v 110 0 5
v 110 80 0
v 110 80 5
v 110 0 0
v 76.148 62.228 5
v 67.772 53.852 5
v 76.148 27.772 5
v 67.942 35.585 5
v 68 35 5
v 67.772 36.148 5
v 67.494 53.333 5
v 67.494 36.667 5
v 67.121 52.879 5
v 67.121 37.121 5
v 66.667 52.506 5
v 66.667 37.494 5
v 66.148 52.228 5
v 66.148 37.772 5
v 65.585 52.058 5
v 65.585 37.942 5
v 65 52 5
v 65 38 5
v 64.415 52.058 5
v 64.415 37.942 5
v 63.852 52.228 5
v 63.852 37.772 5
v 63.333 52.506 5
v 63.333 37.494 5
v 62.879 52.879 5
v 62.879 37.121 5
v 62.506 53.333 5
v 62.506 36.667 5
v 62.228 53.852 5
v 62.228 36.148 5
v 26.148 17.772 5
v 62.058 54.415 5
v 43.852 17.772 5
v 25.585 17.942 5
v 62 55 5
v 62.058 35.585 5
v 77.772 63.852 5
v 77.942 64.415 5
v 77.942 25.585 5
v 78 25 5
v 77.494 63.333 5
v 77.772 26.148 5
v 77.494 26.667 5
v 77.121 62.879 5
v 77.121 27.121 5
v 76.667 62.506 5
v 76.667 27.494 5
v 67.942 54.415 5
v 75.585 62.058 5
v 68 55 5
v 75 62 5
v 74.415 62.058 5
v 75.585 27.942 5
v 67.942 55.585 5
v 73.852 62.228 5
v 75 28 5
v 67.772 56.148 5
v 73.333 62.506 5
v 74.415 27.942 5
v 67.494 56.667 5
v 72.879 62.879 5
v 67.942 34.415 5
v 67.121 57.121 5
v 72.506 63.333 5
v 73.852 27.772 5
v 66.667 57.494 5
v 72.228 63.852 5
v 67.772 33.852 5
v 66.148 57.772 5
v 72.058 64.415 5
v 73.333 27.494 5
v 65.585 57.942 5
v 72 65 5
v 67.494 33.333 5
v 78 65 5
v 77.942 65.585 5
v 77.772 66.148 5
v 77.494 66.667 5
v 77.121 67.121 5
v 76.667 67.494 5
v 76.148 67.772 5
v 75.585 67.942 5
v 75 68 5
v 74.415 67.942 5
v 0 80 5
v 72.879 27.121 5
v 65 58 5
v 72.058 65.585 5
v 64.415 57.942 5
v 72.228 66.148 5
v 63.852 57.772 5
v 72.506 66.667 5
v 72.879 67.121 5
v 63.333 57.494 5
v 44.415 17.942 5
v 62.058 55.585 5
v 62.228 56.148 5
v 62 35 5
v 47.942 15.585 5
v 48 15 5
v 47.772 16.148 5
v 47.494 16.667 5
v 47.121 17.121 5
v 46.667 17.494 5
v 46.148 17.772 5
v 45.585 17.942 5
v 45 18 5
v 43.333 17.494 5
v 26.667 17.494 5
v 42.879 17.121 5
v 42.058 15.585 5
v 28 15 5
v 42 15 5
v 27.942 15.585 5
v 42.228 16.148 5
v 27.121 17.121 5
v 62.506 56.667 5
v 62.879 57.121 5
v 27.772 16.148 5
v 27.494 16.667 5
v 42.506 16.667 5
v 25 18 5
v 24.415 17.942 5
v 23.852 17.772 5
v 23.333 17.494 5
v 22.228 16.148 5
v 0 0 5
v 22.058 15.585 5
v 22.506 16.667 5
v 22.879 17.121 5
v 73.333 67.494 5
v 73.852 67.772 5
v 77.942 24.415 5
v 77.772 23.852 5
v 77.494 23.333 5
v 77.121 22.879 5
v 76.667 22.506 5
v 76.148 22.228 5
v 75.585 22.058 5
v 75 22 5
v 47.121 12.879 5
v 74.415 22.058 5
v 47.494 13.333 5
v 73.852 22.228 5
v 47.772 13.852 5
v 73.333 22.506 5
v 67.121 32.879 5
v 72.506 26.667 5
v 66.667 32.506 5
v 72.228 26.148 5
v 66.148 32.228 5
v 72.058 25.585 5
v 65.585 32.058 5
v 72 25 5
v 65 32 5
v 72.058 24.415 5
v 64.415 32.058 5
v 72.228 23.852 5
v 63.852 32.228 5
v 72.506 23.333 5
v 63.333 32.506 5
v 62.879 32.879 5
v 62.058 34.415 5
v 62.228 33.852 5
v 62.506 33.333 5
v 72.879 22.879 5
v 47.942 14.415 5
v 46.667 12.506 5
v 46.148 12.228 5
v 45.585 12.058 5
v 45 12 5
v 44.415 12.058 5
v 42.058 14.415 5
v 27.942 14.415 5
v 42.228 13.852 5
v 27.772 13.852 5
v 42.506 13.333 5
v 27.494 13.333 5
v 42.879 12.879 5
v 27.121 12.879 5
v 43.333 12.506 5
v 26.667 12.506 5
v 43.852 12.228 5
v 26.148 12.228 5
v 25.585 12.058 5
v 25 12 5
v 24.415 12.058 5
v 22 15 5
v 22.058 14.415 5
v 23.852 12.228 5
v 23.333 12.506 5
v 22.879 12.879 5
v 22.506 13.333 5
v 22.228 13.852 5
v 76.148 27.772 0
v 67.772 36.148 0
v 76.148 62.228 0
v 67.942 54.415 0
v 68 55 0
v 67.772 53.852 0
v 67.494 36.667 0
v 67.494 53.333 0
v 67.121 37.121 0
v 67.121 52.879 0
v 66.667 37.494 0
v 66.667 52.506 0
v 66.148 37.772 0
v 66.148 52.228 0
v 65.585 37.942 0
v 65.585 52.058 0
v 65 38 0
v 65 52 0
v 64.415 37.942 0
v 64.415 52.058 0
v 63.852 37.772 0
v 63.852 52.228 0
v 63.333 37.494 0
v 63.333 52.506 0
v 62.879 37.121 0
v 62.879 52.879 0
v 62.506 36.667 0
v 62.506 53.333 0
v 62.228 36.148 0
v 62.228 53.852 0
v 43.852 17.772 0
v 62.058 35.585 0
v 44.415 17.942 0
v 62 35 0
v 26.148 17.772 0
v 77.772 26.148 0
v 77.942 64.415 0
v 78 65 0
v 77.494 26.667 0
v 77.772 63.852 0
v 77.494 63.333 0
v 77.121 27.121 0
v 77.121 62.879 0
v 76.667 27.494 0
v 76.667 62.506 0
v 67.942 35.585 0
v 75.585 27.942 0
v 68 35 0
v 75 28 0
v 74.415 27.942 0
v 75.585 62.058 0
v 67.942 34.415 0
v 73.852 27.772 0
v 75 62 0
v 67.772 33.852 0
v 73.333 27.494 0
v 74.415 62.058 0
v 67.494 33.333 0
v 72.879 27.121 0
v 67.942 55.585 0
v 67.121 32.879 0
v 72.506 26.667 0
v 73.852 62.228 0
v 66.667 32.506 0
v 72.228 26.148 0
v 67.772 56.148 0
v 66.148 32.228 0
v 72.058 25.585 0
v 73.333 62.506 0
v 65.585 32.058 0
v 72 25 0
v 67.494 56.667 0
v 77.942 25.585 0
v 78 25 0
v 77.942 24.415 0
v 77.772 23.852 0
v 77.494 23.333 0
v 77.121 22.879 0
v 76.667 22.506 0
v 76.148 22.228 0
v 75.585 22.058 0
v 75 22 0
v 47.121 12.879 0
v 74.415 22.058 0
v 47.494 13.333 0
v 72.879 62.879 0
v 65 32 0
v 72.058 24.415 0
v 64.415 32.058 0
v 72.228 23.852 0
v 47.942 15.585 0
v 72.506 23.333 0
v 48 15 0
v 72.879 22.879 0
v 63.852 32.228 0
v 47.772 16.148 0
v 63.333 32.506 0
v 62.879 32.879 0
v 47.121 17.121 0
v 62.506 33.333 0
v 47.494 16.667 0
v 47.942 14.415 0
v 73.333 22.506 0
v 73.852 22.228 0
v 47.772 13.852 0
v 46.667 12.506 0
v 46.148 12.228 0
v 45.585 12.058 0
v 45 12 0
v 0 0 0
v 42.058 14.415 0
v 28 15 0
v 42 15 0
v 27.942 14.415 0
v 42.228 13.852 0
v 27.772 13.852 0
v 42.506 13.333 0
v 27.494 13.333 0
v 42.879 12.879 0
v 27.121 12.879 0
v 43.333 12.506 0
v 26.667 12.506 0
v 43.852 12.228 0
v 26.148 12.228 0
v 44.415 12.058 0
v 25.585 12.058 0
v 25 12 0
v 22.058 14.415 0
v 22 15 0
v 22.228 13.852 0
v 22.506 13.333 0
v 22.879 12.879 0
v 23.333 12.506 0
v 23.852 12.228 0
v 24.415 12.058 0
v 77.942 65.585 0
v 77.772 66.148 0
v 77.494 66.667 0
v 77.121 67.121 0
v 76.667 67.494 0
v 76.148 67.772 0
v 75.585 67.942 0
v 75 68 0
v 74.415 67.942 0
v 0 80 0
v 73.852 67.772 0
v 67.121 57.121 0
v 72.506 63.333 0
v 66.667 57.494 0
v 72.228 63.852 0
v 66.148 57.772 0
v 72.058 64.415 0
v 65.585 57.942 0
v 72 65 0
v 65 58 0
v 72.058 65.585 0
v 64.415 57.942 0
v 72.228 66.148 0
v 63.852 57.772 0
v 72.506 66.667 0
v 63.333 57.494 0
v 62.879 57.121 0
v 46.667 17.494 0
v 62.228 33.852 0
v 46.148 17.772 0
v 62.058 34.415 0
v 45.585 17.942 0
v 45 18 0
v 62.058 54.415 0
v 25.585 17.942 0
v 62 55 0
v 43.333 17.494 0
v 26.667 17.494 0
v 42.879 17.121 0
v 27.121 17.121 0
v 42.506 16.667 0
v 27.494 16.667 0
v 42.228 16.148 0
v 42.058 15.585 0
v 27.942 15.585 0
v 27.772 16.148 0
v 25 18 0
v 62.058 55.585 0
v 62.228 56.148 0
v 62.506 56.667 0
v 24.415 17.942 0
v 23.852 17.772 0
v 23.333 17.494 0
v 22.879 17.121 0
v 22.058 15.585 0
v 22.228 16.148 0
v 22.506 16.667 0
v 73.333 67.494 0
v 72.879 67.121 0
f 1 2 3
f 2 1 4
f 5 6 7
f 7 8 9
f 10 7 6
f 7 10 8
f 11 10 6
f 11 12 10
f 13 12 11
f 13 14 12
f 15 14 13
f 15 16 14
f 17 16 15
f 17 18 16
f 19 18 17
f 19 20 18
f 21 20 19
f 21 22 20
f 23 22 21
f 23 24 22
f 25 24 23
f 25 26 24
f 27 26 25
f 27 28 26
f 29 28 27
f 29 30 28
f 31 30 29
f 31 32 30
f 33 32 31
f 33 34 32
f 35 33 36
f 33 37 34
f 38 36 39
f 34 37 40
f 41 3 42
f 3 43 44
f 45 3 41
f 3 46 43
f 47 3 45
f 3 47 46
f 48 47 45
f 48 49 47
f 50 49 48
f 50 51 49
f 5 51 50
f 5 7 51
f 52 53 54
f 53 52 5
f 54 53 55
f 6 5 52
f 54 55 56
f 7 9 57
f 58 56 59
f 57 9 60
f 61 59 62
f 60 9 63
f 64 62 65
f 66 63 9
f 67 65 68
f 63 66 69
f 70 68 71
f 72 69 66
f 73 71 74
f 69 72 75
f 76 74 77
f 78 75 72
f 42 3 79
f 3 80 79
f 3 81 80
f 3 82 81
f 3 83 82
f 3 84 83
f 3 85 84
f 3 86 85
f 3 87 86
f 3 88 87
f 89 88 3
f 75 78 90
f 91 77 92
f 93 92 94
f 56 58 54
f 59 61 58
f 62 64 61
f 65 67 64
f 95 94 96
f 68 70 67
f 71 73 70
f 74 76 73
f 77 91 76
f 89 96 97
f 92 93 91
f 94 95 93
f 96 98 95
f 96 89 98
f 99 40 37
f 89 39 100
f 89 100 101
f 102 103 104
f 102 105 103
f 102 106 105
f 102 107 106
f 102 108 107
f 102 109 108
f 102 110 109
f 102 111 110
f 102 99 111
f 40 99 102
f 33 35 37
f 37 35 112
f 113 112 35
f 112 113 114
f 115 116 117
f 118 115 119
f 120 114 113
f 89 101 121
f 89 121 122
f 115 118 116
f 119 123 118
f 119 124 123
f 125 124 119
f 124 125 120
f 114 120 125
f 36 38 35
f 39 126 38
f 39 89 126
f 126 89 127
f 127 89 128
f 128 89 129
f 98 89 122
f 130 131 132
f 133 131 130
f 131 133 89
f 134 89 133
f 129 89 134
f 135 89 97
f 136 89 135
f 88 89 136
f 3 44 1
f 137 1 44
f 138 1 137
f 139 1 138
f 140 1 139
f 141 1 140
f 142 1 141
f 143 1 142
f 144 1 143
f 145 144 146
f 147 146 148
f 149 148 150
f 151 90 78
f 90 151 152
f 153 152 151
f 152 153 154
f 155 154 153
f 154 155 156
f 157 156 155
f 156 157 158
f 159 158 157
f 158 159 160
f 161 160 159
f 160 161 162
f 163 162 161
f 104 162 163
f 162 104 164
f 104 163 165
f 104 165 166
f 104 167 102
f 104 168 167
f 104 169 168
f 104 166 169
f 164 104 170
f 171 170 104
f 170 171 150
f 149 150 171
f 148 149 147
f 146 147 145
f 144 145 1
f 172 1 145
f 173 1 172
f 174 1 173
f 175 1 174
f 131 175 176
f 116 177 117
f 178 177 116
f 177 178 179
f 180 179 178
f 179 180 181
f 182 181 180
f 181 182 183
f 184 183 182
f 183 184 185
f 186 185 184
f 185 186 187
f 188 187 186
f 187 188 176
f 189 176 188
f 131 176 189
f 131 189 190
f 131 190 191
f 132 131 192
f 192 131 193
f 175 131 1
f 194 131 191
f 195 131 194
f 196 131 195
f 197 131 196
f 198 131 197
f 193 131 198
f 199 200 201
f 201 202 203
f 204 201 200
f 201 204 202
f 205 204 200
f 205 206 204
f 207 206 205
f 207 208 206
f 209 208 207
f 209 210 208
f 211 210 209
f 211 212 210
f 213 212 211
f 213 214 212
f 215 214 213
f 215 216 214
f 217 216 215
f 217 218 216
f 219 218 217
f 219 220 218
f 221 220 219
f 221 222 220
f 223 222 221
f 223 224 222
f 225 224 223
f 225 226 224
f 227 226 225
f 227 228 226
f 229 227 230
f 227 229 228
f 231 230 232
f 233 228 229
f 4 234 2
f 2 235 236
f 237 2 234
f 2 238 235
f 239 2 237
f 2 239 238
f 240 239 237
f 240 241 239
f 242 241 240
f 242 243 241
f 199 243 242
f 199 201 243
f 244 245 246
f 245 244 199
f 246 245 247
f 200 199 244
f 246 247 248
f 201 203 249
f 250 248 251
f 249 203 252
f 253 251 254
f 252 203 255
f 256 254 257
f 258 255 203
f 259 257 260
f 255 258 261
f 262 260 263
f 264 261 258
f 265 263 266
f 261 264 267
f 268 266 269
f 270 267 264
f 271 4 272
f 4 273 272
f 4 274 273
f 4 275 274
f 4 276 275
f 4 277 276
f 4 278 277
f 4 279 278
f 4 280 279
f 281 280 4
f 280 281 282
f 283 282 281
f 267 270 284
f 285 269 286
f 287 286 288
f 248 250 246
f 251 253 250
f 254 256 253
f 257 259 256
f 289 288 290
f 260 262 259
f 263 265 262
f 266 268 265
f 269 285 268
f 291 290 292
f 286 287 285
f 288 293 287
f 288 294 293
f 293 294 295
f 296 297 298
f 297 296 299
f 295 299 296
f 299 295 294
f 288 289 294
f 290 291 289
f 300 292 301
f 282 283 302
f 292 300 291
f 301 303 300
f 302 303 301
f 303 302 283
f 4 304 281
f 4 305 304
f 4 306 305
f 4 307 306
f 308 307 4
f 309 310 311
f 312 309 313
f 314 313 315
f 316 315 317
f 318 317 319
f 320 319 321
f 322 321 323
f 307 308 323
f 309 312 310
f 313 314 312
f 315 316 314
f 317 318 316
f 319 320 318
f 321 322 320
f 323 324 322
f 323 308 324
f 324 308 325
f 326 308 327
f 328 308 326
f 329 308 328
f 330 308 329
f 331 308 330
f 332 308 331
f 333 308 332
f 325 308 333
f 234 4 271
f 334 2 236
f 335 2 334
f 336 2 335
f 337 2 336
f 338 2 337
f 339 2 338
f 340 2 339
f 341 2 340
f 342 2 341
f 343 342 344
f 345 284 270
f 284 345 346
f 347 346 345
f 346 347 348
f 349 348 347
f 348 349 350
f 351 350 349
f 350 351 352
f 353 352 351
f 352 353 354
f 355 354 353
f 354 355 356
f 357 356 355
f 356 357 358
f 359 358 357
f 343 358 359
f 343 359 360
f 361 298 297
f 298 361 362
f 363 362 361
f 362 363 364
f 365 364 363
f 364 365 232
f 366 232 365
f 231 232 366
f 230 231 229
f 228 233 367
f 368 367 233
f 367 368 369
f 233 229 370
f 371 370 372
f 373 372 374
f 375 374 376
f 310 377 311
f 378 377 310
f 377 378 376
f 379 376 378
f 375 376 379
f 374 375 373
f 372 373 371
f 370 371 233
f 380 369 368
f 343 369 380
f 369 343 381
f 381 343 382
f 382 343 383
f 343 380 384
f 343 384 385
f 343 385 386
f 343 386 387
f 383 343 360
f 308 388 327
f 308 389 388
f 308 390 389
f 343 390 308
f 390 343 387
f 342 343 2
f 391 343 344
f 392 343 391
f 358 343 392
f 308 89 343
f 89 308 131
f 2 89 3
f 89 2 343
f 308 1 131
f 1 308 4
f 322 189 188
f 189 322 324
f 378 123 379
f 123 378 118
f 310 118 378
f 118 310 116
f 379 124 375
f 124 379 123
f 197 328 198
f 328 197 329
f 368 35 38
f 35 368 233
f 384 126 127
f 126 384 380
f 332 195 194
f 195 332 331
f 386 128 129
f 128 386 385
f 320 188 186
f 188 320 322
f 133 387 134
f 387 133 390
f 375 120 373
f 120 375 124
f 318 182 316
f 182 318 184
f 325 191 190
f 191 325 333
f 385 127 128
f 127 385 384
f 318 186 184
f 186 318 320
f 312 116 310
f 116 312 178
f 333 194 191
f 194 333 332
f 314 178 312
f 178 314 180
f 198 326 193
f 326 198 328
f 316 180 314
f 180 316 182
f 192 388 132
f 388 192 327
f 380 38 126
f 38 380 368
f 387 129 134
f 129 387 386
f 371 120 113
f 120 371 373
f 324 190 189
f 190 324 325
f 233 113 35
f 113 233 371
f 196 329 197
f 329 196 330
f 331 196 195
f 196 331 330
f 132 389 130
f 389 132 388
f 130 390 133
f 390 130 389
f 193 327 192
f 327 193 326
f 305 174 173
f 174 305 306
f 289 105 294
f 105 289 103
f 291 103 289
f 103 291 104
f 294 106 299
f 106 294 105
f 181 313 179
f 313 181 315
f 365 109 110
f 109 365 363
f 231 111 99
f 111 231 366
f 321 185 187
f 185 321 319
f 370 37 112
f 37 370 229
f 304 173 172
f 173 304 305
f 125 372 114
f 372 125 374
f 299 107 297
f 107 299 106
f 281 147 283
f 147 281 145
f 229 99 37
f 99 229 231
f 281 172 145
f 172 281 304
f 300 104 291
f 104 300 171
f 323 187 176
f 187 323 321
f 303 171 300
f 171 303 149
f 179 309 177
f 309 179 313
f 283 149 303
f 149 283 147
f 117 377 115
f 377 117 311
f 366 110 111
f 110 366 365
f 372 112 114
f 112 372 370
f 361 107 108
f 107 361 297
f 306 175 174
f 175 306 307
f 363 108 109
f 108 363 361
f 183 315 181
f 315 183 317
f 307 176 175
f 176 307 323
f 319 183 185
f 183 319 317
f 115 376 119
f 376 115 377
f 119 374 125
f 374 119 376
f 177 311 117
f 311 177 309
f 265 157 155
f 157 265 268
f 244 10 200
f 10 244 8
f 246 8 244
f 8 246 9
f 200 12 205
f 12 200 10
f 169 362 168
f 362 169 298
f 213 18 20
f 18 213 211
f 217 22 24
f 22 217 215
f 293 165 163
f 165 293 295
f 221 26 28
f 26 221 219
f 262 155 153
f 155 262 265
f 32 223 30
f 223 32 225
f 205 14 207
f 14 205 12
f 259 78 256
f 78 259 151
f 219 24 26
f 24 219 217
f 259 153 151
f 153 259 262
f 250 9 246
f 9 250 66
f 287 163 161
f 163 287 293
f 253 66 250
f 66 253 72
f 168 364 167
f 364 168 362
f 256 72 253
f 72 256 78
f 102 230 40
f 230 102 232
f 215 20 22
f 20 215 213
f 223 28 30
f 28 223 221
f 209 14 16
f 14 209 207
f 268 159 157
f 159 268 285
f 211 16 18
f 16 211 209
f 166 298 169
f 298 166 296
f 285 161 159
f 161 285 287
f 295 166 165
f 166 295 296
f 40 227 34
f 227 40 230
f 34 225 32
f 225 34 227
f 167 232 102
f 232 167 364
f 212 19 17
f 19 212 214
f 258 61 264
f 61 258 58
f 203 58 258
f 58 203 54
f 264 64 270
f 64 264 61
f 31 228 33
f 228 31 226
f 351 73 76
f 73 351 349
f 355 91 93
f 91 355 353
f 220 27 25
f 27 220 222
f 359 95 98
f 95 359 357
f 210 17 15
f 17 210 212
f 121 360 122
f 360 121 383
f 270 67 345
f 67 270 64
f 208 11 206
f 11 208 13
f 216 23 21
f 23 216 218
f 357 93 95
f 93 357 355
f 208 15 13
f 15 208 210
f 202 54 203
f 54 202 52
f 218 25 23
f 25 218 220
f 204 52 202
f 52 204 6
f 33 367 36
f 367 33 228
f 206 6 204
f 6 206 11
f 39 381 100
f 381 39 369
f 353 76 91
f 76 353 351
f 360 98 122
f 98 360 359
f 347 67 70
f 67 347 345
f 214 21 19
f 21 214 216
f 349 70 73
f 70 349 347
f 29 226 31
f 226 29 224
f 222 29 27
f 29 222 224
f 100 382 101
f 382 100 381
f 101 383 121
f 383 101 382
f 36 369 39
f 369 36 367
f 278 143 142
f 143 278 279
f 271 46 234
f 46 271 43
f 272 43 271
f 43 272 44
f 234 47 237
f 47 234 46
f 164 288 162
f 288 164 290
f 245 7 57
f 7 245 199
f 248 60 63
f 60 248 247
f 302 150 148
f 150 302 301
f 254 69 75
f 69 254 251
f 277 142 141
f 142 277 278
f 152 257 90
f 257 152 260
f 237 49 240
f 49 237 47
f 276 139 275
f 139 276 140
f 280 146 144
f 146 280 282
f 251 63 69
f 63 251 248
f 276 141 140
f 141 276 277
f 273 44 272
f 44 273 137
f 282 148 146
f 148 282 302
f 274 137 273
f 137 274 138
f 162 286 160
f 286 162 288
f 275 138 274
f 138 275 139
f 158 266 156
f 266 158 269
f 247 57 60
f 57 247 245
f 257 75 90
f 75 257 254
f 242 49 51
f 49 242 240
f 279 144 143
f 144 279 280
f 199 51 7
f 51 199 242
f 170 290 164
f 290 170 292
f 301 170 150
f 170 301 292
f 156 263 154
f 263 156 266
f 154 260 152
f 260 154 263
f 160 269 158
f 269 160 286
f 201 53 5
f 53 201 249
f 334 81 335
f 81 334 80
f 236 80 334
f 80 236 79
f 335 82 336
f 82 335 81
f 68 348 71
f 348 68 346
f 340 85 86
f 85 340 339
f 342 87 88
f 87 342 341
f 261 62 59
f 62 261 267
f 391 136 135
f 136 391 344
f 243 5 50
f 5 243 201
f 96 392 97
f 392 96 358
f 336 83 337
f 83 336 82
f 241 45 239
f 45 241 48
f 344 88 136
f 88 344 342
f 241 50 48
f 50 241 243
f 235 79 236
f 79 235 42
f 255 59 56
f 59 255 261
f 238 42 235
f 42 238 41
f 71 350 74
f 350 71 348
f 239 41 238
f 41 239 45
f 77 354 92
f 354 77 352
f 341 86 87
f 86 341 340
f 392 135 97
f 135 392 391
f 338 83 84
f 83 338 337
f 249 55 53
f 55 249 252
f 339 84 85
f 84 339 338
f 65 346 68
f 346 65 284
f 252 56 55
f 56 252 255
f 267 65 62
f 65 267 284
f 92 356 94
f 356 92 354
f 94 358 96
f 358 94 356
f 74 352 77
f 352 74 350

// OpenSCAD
$fn = 32;

// ----------------------------------------------------------------------
// Hole field: plate with holes at given coordinates
// ----------------------------------------------------------------------

// --- parameters (mm) ---
plate_l = 110;            // plate length, X
plate_w = 80;             // plate width, Y
plate_t = 5;              // plate thickness, Z
hole_d = 6;               // hole diameter

difference() {
  cube([plate_l, plate_w, plate_t]);
  translate([25, 15, -1]) cylinder(h = plate_t + 2, d = hole_d);
  translate([45, 15, -1]) cylinder(h = plate_t + 2, d = hole_d);
  translate([65, 35, -1]) cylinder(h = plate_t + 2, d = hole_d);
  translate([65, 55, -1]) cylinder(h = plate_t + 2, d = hole_d);
  translate([75, 25, -1]) cylinder(h = plate_t + 2, d = hole_d);
  translate([75, 65, -1]) cylinder(h = plate_t + 2, d = hole_d);
}
